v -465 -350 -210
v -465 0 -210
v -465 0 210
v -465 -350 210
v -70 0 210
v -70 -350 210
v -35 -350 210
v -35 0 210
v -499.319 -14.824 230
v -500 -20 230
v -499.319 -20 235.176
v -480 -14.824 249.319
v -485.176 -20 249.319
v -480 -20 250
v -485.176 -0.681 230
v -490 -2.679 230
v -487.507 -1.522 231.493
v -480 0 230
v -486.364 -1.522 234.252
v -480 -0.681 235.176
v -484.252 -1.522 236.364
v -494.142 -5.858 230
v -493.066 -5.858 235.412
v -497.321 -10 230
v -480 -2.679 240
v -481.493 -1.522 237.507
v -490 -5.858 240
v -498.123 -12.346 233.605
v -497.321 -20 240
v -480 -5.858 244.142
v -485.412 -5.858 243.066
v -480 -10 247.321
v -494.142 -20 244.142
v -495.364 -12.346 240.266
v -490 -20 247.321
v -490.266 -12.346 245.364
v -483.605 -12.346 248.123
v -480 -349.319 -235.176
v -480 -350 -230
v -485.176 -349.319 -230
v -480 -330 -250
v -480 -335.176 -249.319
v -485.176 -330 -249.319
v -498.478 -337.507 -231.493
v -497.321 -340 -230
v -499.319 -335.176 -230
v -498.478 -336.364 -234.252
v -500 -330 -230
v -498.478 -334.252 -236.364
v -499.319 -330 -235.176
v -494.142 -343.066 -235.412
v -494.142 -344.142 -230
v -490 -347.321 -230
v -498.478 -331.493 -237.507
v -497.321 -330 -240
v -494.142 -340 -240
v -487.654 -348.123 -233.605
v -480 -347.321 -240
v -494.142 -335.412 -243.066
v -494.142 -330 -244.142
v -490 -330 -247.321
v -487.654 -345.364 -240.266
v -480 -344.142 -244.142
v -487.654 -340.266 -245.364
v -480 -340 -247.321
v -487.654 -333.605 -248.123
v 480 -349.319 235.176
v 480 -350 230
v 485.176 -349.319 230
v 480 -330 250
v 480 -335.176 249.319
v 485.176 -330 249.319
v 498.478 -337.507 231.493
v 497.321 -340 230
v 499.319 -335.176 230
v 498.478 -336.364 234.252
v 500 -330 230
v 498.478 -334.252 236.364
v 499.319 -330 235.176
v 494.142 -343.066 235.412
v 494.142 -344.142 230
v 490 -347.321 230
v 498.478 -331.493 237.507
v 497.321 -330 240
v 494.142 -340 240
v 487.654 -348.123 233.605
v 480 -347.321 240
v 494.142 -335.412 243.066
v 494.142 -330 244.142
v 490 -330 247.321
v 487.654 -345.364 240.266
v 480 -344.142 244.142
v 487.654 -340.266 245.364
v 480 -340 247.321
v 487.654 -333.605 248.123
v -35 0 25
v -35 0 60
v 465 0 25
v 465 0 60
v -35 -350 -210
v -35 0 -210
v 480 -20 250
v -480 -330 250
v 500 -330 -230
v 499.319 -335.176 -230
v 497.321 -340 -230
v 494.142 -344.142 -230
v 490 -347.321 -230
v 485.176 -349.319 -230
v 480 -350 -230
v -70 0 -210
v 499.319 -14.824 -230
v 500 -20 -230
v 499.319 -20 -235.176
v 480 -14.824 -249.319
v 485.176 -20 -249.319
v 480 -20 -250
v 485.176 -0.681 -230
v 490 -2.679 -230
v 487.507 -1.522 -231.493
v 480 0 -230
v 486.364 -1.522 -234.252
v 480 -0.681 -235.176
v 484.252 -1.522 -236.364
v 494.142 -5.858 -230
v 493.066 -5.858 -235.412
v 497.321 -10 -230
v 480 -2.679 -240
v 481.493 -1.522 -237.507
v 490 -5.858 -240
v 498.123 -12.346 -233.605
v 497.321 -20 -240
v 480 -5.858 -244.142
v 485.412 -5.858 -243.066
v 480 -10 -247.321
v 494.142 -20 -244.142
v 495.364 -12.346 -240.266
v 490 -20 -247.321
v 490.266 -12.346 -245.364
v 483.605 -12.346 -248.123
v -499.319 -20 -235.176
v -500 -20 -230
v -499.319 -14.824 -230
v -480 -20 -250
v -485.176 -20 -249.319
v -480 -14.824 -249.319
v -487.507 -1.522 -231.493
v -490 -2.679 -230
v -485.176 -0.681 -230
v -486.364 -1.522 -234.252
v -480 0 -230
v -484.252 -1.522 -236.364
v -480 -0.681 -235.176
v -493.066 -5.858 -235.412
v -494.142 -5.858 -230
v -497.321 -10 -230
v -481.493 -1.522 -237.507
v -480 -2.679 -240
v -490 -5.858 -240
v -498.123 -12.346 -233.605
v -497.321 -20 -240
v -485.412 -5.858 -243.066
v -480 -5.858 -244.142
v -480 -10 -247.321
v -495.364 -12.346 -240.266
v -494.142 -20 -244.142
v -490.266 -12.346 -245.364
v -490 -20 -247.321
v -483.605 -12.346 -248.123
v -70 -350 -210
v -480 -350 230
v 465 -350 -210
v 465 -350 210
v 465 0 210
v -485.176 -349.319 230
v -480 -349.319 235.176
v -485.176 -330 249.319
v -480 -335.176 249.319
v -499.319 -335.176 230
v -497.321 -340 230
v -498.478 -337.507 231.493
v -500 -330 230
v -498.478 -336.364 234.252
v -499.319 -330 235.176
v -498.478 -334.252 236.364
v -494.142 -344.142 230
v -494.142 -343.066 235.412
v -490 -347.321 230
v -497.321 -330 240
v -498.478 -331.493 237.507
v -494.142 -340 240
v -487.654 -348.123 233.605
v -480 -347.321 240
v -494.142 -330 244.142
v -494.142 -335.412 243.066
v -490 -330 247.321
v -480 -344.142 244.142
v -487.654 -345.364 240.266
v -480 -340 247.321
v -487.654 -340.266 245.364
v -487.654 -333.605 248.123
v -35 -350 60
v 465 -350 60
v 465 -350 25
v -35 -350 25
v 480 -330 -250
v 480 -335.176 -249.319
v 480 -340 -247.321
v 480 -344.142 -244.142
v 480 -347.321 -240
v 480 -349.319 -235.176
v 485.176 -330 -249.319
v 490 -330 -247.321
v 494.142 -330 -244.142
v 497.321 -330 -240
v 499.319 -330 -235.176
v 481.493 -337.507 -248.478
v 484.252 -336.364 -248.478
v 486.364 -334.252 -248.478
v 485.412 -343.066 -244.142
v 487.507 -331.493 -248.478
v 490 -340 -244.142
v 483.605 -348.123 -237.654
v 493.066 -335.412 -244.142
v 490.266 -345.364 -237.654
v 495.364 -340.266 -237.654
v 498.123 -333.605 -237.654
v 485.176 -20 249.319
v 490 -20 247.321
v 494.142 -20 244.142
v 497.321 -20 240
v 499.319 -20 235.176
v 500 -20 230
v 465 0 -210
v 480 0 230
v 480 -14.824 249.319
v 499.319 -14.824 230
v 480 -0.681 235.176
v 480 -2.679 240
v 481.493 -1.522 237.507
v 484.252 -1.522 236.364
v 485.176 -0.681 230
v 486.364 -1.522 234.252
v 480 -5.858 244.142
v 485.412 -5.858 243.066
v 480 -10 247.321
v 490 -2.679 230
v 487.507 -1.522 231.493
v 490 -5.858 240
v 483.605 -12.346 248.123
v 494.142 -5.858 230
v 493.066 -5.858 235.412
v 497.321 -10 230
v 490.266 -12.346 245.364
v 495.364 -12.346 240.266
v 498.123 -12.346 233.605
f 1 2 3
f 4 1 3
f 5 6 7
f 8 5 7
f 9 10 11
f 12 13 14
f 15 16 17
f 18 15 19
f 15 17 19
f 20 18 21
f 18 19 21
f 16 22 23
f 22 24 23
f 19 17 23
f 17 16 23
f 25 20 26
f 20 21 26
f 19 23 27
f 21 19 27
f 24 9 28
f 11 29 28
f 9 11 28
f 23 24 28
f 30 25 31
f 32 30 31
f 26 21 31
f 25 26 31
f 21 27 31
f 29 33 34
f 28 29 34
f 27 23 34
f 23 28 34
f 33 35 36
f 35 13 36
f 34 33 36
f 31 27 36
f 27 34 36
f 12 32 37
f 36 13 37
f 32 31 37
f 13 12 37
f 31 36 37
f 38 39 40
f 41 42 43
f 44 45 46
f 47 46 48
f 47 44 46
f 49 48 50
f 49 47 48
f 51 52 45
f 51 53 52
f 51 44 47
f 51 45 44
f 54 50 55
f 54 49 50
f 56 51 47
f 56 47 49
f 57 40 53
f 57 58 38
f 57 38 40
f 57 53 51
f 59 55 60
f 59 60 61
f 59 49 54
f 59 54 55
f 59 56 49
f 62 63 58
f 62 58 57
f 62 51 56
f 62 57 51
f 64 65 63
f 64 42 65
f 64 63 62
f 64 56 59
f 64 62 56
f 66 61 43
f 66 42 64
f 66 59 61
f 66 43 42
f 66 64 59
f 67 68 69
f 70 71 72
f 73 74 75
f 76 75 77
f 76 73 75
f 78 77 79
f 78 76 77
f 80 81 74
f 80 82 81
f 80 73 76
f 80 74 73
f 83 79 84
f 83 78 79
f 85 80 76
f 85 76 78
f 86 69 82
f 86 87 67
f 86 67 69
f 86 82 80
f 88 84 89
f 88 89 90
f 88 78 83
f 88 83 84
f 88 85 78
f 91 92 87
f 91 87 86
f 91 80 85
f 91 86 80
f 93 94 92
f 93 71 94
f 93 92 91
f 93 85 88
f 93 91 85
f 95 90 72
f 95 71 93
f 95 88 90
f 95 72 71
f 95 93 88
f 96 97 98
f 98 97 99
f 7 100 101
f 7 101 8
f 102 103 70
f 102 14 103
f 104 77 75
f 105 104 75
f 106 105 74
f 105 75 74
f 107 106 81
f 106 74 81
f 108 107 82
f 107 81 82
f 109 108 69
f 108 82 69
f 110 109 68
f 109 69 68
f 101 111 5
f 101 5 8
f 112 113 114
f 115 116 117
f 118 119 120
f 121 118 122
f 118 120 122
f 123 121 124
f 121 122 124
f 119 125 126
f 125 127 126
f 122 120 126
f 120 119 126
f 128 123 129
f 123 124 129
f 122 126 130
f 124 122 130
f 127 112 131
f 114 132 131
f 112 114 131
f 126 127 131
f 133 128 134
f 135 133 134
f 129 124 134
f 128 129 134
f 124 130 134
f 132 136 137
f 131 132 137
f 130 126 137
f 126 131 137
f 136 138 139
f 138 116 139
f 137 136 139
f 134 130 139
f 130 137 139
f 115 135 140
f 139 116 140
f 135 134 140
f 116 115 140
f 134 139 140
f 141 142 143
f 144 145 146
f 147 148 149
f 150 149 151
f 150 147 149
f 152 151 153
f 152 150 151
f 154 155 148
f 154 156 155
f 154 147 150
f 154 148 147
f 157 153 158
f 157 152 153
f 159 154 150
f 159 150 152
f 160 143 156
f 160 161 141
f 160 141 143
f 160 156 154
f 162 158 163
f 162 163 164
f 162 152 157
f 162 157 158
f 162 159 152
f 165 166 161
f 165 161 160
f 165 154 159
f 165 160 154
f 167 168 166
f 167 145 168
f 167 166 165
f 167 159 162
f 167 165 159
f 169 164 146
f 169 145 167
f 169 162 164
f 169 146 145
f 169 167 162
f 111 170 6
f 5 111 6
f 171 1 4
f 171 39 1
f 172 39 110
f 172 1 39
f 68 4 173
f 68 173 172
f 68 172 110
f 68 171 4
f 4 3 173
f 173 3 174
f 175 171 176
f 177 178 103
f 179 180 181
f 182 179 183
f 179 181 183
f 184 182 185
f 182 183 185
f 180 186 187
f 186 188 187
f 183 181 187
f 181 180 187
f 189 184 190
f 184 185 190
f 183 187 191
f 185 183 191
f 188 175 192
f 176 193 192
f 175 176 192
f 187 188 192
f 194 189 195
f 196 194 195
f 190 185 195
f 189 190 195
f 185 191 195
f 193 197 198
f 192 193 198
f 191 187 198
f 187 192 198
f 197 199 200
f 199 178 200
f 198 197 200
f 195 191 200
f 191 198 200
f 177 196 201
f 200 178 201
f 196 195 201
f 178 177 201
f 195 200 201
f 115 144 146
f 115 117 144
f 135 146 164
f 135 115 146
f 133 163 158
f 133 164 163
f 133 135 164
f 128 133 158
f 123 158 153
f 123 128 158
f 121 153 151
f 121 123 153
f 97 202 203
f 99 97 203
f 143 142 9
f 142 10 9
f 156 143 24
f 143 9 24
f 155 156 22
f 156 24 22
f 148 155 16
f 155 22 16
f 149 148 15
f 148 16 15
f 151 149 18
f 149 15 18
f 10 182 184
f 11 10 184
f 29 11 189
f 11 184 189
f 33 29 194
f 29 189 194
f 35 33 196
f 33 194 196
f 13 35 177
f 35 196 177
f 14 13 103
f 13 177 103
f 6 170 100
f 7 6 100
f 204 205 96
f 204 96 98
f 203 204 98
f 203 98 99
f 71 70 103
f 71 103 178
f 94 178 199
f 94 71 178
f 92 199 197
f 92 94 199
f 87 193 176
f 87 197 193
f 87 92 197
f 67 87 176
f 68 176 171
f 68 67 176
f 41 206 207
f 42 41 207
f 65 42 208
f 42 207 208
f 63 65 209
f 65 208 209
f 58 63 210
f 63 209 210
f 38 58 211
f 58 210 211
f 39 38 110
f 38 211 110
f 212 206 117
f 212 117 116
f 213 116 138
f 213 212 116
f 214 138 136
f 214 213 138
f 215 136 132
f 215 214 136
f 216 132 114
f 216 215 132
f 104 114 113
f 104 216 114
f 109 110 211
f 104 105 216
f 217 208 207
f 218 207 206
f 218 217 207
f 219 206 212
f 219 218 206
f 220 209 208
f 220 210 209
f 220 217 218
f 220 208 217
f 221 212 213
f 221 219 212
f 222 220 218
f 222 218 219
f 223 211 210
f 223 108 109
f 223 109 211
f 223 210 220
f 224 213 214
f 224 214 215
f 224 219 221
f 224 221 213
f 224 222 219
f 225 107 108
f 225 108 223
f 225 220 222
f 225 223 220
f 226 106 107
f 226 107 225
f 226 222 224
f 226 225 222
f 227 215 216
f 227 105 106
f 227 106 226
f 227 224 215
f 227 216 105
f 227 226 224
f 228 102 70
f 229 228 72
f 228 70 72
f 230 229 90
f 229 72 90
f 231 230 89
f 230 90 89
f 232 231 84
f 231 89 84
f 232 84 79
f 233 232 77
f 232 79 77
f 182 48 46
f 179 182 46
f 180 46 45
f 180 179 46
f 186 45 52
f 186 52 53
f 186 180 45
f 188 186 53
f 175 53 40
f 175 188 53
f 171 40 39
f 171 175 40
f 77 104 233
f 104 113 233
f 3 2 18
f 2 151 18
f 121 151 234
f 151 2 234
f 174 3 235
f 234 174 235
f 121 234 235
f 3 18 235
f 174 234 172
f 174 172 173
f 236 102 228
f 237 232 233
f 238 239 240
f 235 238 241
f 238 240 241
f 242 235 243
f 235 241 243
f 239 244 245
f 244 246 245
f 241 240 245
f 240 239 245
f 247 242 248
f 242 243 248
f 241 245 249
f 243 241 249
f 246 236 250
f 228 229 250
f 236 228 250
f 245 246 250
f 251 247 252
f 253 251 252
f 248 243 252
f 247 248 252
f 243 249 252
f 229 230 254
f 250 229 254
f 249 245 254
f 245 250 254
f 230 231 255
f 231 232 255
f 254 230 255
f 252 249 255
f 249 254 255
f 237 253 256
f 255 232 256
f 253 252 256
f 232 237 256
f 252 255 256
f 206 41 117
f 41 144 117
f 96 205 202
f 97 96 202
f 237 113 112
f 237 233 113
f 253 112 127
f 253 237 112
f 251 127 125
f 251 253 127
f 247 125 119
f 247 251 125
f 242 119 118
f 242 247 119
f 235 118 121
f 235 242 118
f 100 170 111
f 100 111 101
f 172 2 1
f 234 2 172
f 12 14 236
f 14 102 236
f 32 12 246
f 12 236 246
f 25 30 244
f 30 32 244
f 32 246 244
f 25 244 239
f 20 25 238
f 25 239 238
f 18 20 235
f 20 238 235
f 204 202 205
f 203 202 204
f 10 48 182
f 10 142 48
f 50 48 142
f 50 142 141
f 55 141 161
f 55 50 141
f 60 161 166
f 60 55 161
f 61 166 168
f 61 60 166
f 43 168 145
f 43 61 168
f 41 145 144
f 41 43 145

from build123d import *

# Parameters (mm, degrees)
F0_W     = 1000
F0_H     = 500
F0_W_2   = 930
F0_H_2   = 420
F1_DEPTH = 350
F2_R     = 20
F3_W     = 35
F3_H     = 420
F4_DEPTH = 350
F5_W     = 500
F5_H     = 35
F6_DEPTH = 350


with BuildPart() as f1:
    # F0 (on Front) → F1 (new body)
    with BuildSketch(Plane.XZ):
        Rectangle(F0_W, F0_H)
        Rectangle(F0_W_2, F0_H_2, mode=Mode.SUBTRACT)
    extrude(amount=F1_DEPTH)

    # F2
    f2_edges = [f1.edges().sort_by_distance(p)[0] for p in [
        (0, -350, 250),
        (500, -350, 0),
        (0, -350, -250),
        (-500, -350, 0),
        (-500, -175, 250),
        (500, -175, 250),
        (500, -175, -250),
        (-500, -175, -250),
        (-500, 0, 0),
        (0, 0, 250),
        (500, 0, 0),
        (0, 0, -250),
    ]]
    fillet(f2_edges, radius=F2_R)


with BuildPart() as f4:
    # F3 (on face) → F4 (new body)
    with BuildSketch(Plane.XZ.offset(350)):
        with Locations((-52.5, 0)):
            Rectangle(F3_W, F3_H)
    extrude(amount=-F4_DEPTH)


with BuildPart() as f6:
    # F5 (on face) → F6 (new body)
    with BuildSketch(Plane.XZ.offset(350)):
        with Locations((215, 42.5)):
            Rectangle(F5_W, F5_H)
    extrude(amount=-F6_DEPTH)


solid = Compound([f1.part, f4.part, f6.part])
